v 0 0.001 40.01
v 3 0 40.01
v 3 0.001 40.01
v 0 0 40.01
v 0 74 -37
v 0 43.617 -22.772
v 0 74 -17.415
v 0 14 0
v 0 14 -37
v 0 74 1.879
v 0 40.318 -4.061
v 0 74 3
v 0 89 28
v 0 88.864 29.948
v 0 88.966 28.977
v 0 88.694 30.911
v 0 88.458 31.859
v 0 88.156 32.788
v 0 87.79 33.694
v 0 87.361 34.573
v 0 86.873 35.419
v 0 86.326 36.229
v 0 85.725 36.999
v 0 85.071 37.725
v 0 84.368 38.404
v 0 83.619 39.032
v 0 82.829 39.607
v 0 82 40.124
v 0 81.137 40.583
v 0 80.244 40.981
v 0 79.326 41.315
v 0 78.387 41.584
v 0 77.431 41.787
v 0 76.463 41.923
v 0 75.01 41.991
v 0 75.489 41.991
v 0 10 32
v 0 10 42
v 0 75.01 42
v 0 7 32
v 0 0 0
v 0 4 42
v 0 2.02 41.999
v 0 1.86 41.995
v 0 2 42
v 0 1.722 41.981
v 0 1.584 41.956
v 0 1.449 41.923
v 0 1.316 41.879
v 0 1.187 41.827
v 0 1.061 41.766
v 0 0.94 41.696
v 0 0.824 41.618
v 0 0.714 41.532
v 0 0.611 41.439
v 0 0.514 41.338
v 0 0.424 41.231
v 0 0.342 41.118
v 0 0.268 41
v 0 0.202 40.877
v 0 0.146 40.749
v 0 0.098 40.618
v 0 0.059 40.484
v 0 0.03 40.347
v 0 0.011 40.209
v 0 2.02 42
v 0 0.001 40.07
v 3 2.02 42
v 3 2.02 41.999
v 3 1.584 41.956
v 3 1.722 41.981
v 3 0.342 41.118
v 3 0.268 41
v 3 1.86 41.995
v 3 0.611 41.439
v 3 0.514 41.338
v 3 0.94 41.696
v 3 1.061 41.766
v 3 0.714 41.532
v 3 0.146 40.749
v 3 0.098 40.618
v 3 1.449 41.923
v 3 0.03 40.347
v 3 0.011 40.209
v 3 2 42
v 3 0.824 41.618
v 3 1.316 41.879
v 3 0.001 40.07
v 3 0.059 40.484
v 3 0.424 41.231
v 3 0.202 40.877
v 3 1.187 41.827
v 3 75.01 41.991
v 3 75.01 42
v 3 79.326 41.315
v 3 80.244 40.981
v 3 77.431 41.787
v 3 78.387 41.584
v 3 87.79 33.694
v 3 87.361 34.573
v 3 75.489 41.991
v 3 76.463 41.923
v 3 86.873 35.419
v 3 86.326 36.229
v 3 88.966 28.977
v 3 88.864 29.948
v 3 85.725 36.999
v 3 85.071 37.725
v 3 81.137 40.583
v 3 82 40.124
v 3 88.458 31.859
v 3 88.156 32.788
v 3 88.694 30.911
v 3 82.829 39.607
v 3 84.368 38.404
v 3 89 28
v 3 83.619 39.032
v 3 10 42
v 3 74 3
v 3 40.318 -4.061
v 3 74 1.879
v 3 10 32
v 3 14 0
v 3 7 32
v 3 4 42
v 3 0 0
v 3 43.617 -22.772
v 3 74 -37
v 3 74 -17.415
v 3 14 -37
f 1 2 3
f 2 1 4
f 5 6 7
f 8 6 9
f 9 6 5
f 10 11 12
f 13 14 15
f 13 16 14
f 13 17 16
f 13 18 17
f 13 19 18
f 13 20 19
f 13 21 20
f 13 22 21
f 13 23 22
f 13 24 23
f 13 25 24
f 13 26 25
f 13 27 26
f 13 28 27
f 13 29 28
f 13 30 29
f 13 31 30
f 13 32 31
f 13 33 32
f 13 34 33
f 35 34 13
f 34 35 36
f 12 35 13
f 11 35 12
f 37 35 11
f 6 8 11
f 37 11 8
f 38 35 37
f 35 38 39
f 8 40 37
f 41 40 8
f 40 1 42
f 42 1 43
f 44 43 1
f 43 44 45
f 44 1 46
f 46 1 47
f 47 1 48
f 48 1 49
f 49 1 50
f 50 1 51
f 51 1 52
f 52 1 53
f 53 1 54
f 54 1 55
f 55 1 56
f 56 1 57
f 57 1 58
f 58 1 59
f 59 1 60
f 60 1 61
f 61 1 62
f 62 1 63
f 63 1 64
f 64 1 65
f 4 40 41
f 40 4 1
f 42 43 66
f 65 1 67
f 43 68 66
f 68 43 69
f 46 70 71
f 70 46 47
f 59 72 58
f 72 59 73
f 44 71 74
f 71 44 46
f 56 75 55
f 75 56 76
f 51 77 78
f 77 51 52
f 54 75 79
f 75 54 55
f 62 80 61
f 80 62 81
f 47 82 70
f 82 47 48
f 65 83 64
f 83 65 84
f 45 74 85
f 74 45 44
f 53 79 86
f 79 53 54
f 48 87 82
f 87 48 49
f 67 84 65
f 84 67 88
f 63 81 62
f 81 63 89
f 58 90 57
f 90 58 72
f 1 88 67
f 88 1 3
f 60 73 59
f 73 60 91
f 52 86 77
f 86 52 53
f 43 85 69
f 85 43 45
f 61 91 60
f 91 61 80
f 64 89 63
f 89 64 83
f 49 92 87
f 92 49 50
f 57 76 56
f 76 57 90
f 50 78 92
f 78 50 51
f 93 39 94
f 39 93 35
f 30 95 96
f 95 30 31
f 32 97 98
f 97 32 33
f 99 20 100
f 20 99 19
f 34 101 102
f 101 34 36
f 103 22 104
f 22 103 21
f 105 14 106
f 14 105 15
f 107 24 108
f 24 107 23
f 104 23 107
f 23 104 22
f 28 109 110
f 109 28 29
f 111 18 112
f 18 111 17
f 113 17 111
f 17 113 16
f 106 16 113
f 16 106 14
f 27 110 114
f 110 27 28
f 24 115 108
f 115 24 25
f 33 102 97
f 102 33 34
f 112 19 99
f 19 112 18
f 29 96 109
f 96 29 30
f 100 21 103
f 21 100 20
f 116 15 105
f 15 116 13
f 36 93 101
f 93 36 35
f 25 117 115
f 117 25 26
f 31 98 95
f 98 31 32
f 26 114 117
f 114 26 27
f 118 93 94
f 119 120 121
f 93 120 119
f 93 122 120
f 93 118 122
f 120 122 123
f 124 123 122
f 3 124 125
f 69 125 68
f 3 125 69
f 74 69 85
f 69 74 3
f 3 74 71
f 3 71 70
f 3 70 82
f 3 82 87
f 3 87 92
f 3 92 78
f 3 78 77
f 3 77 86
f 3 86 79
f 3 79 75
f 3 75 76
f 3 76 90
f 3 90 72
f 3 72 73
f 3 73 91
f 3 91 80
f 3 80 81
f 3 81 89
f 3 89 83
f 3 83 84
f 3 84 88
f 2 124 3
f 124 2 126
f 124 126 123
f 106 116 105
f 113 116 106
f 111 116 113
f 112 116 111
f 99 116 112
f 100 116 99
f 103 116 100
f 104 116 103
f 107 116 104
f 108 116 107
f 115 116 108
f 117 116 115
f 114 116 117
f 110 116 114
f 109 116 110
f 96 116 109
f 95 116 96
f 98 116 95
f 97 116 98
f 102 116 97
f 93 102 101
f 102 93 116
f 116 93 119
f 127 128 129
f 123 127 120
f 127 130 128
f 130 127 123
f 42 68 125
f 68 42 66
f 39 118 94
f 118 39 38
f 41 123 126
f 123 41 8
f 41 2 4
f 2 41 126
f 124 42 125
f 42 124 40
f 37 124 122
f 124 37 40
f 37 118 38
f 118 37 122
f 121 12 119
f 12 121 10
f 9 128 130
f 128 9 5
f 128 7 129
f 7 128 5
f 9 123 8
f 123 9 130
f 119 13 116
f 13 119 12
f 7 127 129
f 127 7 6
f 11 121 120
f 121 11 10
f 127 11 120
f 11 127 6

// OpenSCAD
// When cutting using the difference operator, it is necessary
// for the cutting tool to be slightly larger than the target to
// ensure that math errors don't happen
// "e" is the global fudge factor for cutting operations
e = 0.2;
e2 = 0.01;

// FA is minimum angle for an arc.  Smaller = smoother
// For faster previews, set $fa = 10
// For smooth renders, set $fa = 1.0 or less
$fa = 0.5;

// FS is the minimum fragment size
// There is no use having fragments smaller than layer height
$fs = 0.2;

// Smoothing for rounded box functions.  Set to 90 for final
smooth = 90;
    
// Unit are mm
railWidth = 89.0;
railHeightInner = 42.0;
railHeightOuter = 79.0;

cardRailShoulder = 4.0;
cardRailWidth = 6.0;
cardRailDepth = 10.0;

objectWidth = 3.0;
smallRadius = 2.0;
bigRadius = 14.0;
railChamferX = 15.0;
railChamferY = 25;

railLowerH = railHeightOuter-railHeightInner;
railLowerW = 60.0;

slotHeight = 19;
slotDepth = 35;
slotShoulder = 7.0;

// A box that is rounded on 2 edges along the x axis
module box_rounded_2x(box_l,box_w,box_h,edge1_r,edge2_r,smooth) {

    ctr = false;
    
    // Roundover by building cube and then subtracting from it using cutting tools 
    difference() {
       cube([box_l, box_w, box_h], center = ctr);
        
        // First rounded edge
        // Translate to front edge of box, make a cutting tool by subtracting a cylinder
        // from a cube
        translate([0, 0, box_h-edge1_r*2]) {
            difference() {
                color("green")
                translate([0,-edge1_r+e2,edge1_r+e2])
                   cube([box_l+2*e2, edge1_r*2+e2, edge1_r*2+e2]);
                color("purple")
                rotate(a=[0,90,0])
                translate([-edge1_r,edge1_r,0])
                    cylinder(box_l+4*e2,edge1_r,edge1_r,$fn=smooth);
            }
        }
           
        // Second rounded edge
        // Translate to back edge of box, make a cutting tool by subtracting a cylinder
        // from a cube
        translate([0, box_w-edge2_r*2, box_h]) 
        rotate([270,0,0]) {
            difference() {
                color("blue")
                translate([0,-edge2_r+e2,edge2_r+e2])
                    cube([box_l+2*e2, edge2_r*2+e2, edge2_r*2+e2], center = ctr);
                color("red") 
                rotate(a=[0,90,0])
                translate([-edge2_r,edge2_r,0])
                    cylinder(box_l+4*e2,edge2_r,edge2_r,center=ctr,$fn=smooth);
            }
        }
        
    }
}

module triangle_ext(points,height) {
    verts = [[0,1,2]];
    color("blue")
    linear_extrude(height = height, center = false, convexity = 10, twist = 0)
        polygon(points,verts);
}

module quad_ext(points,height) {
    verts = [[0,1,2,3]];
    color("blue")
    linear_extrude(height = height, center = false, convexity = 10, twist = 0)
        polygon(points,verts);
}

cardRailPoints = [ [0,cardRailDepth],[cardRailWidth,cardRailDepth],[cardRailWidth,0],[cardRailWidth-3,0]];

difference() {
    union() {

        difference() {
            box_rounded_2x(objectWidth,railWidth,railHeightInner,smallRadius,bigRadius,smooth);

            // Cut out card rail
            color("red")
            translate([0,cardRailShoulder,railHeightInner-cardRailDepth])
                rotate([90,0,90])
                quad_ext(cardRailPoints,objectWidth);
                
            // Cut out chamfer area in back
            translate([-e,railWidth-railChamferX,-e])
            color("red")
            cube([objectWidth+e*2,railChamferX,railHeightInner-bigRadius+e]);    
        }

        // Add in lower rail body
        color("blue")
        translate([0,railWidth-railLowerW-railChamferX,-railLowerH])
        cube([objectWidth,railLowerW,railLowerH]);

        // Add in chamfer on back of rail
        points = [ [0,0], [0,railChamferX],[railChamferY,railChamferX] ];
        color("red")
        translate([objectWidth,railWidth,railHeightInner-bigRadius])
        rotate([0,90,180])
        triangle_ext(points,objectWidth);
    }

    // Cut out slot
    color("red")
    rotate([10,0,0])
    translate([-e,railWidth-slotDepth-railChamferX,-railLowerH+slotShoulder])
        cube([objectWidth+e*2,slotDepth,slotHeight]);
}
